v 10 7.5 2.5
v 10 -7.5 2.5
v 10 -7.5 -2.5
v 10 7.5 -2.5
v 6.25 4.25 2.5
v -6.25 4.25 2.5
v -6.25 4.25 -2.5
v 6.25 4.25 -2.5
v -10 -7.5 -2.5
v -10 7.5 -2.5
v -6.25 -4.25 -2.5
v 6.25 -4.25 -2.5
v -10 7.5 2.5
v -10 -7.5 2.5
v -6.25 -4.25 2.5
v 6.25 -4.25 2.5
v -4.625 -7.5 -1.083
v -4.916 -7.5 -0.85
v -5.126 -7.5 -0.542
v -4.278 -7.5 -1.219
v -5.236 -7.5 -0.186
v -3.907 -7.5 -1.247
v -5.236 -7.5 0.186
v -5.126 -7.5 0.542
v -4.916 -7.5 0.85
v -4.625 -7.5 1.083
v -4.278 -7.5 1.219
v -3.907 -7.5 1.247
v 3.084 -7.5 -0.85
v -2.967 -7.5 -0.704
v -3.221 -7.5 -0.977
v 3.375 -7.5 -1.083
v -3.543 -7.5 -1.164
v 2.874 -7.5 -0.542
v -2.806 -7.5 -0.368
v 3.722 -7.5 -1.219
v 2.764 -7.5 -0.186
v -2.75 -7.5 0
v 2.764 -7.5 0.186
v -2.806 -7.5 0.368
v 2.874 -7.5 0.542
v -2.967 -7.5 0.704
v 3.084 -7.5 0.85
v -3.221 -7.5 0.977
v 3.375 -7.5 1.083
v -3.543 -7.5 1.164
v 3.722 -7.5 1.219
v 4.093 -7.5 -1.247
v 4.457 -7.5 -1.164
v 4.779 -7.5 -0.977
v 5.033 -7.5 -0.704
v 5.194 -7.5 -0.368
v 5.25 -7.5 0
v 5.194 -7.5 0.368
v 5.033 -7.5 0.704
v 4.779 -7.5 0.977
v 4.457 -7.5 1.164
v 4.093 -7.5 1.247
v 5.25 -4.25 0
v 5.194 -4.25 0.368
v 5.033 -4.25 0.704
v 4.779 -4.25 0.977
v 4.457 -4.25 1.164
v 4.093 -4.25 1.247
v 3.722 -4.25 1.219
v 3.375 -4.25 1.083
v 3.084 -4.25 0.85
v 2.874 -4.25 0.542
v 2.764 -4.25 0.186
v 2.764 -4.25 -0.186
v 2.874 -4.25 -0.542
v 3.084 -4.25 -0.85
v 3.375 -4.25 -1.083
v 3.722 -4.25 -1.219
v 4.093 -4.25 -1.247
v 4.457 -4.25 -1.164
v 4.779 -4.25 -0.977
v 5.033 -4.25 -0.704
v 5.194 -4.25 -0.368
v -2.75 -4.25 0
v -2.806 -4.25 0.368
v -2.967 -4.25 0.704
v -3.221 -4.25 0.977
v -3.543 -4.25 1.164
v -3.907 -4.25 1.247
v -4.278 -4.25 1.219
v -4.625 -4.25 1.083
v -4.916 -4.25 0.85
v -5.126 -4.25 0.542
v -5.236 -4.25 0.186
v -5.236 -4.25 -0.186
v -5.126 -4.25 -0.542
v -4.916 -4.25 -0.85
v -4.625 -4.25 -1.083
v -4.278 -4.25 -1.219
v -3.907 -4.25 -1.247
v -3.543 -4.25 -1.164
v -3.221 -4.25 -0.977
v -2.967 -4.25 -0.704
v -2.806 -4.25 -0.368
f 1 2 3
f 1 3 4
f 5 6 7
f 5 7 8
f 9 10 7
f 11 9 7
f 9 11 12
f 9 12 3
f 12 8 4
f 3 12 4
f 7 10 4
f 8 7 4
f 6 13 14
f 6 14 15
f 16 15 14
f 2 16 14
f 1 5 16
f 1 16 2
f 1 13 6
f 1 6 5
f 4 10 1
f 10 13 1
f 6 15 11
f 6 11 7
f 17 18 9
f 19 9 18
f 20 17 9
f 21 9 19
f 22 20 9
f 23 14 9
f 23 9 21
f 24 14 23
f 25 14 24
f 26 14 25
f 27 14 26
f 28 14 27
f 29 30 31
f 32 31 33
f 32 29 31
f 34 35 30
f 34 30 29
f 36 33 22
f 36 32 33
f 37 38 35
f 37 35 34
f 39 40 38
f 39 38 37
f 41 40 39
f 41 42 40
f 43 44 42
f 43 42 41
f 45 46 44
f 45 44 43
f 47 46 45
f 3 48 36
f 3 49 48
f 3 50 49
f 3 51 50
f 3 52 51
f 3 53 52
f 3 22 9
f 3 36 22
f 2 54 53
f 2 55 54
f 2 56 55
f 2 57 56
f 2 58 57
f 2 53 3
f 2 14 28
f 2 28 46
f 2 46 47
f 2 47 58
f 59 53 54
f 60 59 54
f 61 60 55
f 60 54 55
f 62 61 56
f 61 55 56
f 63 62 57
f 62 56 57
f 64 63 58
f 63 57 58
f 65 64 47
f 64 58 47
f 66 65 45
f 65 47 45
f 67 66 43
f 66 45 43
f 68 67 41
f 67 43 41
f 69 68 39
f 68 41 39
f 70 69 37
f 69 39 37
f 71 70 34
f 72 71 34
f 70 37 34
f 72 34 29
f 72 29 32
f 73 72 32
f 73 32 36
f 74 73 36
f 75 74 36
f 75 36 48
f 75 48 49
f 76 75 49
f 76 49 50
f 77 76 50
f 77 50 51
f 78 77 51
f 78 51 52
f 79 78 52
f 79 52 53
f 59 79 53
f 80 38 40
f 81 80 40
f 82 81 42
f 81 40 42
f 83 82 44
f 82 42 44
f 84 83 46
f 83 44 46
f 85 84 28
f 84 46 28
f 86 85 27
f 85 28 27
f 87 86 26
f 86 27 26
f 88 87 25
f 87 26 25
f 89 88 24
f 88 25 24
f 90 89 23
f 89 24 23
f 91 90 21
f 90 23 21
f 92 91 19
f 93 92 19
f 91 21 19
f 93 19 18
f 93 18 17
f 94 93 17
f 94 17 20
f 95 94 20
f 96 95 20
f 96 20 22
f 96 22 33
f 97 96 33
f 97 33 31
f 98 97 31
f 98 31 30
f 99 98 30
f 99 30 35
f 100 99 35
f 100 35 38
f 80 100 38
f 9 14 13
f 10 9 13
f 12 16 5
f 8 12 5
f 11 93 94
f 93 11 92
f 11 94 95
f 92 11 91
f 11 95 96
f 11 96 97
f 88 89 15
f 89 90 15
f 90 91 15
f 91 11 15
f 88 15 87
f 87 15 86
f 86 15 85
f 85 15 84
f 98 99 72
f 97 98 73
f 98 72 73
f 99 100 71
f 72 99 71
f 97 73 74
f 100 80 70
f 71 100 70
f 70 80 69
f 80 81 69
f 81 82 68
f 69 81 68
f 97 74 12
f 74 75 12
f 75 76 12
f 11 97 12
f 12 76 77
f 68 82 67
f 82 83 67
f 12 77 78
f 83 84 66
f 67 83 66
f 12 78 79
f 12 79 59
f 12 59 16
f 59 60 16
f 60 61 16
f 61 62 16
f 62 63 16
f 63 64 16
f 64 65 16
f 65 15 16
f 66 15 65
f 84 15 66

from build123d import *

# Parameters (mm, degrees)
SKETCH_1_W          = 20
SKETCH_1_H          = 15
EXTRUDE_1_DEPTH     = 2.5
SKETCH_2_W          = 12.5
SKETCH_2_H          = 8.5
CUT_EXTRUDE_1_DEPTH = 6
CUT_EXTRUDE_2_REACH = 17
SKETCH_4_R          = 1.25


with BuildPart() as part:
    # 草圖1 → 填料-伸長1 (new body, symmetric)
    with BuildSketch(Plane.XY):
        Rectangle(SKETCH_1_W, SKETCH_1_H)
    extrude(amount=EXTRUDE_1_DEPTH, both=True)

    # 草圖2 → 除料-伸長1 (cut, through all)
    with BuildSketch(Plane.XY.offset(2.5)):
        Rectangle(SKETCH_2_W, SKETCH_2_H)
    extrude(amount=-CUT_EXTRUDE_1_DEPTH, mode=Mode.SUBTRACT)

    # 草圖4 → 除料-伸長2 (cut, up to next)
    with BuildSketch(Plane.XZ.offset(7.5), mode=Mode.PRIVATE) as cut_extrude_2_sk1:
        with Locations((-4, 0)):
            Circle(SKETCH_4_R)
    cut_extrude_2_tool1 = extrude(cut_extrude_2_sk1.sketch, amount=-CUT_EXTRUDE_2_REACH, mode=Mode.PRIVATE) & part.part
    add(cut_extrude_2_tool1.solids().sort_by_distance((-4, -7.5, 0))[0], mode=Mode.SUBTRACT)
    # 草圖4 → 除料-伸長2 (cut, up to next)
    with BuildSketch(Plane.XZ.offset(7.5), mode=Mode.PRIVATE) as cut_extrude_2_sk2:
        with Locations((4, 0)):
            Circle(SKETCH_4_R)
    cut_extrude_2_tool2 = extrude(cut_extrude_2_sk2.sketch, amount=-CUT_EXTRUDE_2_REACH, mode=Mode.PRIVATE) & part.part
    add(cut_extrude_2_tool2.solids().sort_by_distance((4, -7.5, 0))[0], mode=Mode.SUBTRACT)


solid = part.part
